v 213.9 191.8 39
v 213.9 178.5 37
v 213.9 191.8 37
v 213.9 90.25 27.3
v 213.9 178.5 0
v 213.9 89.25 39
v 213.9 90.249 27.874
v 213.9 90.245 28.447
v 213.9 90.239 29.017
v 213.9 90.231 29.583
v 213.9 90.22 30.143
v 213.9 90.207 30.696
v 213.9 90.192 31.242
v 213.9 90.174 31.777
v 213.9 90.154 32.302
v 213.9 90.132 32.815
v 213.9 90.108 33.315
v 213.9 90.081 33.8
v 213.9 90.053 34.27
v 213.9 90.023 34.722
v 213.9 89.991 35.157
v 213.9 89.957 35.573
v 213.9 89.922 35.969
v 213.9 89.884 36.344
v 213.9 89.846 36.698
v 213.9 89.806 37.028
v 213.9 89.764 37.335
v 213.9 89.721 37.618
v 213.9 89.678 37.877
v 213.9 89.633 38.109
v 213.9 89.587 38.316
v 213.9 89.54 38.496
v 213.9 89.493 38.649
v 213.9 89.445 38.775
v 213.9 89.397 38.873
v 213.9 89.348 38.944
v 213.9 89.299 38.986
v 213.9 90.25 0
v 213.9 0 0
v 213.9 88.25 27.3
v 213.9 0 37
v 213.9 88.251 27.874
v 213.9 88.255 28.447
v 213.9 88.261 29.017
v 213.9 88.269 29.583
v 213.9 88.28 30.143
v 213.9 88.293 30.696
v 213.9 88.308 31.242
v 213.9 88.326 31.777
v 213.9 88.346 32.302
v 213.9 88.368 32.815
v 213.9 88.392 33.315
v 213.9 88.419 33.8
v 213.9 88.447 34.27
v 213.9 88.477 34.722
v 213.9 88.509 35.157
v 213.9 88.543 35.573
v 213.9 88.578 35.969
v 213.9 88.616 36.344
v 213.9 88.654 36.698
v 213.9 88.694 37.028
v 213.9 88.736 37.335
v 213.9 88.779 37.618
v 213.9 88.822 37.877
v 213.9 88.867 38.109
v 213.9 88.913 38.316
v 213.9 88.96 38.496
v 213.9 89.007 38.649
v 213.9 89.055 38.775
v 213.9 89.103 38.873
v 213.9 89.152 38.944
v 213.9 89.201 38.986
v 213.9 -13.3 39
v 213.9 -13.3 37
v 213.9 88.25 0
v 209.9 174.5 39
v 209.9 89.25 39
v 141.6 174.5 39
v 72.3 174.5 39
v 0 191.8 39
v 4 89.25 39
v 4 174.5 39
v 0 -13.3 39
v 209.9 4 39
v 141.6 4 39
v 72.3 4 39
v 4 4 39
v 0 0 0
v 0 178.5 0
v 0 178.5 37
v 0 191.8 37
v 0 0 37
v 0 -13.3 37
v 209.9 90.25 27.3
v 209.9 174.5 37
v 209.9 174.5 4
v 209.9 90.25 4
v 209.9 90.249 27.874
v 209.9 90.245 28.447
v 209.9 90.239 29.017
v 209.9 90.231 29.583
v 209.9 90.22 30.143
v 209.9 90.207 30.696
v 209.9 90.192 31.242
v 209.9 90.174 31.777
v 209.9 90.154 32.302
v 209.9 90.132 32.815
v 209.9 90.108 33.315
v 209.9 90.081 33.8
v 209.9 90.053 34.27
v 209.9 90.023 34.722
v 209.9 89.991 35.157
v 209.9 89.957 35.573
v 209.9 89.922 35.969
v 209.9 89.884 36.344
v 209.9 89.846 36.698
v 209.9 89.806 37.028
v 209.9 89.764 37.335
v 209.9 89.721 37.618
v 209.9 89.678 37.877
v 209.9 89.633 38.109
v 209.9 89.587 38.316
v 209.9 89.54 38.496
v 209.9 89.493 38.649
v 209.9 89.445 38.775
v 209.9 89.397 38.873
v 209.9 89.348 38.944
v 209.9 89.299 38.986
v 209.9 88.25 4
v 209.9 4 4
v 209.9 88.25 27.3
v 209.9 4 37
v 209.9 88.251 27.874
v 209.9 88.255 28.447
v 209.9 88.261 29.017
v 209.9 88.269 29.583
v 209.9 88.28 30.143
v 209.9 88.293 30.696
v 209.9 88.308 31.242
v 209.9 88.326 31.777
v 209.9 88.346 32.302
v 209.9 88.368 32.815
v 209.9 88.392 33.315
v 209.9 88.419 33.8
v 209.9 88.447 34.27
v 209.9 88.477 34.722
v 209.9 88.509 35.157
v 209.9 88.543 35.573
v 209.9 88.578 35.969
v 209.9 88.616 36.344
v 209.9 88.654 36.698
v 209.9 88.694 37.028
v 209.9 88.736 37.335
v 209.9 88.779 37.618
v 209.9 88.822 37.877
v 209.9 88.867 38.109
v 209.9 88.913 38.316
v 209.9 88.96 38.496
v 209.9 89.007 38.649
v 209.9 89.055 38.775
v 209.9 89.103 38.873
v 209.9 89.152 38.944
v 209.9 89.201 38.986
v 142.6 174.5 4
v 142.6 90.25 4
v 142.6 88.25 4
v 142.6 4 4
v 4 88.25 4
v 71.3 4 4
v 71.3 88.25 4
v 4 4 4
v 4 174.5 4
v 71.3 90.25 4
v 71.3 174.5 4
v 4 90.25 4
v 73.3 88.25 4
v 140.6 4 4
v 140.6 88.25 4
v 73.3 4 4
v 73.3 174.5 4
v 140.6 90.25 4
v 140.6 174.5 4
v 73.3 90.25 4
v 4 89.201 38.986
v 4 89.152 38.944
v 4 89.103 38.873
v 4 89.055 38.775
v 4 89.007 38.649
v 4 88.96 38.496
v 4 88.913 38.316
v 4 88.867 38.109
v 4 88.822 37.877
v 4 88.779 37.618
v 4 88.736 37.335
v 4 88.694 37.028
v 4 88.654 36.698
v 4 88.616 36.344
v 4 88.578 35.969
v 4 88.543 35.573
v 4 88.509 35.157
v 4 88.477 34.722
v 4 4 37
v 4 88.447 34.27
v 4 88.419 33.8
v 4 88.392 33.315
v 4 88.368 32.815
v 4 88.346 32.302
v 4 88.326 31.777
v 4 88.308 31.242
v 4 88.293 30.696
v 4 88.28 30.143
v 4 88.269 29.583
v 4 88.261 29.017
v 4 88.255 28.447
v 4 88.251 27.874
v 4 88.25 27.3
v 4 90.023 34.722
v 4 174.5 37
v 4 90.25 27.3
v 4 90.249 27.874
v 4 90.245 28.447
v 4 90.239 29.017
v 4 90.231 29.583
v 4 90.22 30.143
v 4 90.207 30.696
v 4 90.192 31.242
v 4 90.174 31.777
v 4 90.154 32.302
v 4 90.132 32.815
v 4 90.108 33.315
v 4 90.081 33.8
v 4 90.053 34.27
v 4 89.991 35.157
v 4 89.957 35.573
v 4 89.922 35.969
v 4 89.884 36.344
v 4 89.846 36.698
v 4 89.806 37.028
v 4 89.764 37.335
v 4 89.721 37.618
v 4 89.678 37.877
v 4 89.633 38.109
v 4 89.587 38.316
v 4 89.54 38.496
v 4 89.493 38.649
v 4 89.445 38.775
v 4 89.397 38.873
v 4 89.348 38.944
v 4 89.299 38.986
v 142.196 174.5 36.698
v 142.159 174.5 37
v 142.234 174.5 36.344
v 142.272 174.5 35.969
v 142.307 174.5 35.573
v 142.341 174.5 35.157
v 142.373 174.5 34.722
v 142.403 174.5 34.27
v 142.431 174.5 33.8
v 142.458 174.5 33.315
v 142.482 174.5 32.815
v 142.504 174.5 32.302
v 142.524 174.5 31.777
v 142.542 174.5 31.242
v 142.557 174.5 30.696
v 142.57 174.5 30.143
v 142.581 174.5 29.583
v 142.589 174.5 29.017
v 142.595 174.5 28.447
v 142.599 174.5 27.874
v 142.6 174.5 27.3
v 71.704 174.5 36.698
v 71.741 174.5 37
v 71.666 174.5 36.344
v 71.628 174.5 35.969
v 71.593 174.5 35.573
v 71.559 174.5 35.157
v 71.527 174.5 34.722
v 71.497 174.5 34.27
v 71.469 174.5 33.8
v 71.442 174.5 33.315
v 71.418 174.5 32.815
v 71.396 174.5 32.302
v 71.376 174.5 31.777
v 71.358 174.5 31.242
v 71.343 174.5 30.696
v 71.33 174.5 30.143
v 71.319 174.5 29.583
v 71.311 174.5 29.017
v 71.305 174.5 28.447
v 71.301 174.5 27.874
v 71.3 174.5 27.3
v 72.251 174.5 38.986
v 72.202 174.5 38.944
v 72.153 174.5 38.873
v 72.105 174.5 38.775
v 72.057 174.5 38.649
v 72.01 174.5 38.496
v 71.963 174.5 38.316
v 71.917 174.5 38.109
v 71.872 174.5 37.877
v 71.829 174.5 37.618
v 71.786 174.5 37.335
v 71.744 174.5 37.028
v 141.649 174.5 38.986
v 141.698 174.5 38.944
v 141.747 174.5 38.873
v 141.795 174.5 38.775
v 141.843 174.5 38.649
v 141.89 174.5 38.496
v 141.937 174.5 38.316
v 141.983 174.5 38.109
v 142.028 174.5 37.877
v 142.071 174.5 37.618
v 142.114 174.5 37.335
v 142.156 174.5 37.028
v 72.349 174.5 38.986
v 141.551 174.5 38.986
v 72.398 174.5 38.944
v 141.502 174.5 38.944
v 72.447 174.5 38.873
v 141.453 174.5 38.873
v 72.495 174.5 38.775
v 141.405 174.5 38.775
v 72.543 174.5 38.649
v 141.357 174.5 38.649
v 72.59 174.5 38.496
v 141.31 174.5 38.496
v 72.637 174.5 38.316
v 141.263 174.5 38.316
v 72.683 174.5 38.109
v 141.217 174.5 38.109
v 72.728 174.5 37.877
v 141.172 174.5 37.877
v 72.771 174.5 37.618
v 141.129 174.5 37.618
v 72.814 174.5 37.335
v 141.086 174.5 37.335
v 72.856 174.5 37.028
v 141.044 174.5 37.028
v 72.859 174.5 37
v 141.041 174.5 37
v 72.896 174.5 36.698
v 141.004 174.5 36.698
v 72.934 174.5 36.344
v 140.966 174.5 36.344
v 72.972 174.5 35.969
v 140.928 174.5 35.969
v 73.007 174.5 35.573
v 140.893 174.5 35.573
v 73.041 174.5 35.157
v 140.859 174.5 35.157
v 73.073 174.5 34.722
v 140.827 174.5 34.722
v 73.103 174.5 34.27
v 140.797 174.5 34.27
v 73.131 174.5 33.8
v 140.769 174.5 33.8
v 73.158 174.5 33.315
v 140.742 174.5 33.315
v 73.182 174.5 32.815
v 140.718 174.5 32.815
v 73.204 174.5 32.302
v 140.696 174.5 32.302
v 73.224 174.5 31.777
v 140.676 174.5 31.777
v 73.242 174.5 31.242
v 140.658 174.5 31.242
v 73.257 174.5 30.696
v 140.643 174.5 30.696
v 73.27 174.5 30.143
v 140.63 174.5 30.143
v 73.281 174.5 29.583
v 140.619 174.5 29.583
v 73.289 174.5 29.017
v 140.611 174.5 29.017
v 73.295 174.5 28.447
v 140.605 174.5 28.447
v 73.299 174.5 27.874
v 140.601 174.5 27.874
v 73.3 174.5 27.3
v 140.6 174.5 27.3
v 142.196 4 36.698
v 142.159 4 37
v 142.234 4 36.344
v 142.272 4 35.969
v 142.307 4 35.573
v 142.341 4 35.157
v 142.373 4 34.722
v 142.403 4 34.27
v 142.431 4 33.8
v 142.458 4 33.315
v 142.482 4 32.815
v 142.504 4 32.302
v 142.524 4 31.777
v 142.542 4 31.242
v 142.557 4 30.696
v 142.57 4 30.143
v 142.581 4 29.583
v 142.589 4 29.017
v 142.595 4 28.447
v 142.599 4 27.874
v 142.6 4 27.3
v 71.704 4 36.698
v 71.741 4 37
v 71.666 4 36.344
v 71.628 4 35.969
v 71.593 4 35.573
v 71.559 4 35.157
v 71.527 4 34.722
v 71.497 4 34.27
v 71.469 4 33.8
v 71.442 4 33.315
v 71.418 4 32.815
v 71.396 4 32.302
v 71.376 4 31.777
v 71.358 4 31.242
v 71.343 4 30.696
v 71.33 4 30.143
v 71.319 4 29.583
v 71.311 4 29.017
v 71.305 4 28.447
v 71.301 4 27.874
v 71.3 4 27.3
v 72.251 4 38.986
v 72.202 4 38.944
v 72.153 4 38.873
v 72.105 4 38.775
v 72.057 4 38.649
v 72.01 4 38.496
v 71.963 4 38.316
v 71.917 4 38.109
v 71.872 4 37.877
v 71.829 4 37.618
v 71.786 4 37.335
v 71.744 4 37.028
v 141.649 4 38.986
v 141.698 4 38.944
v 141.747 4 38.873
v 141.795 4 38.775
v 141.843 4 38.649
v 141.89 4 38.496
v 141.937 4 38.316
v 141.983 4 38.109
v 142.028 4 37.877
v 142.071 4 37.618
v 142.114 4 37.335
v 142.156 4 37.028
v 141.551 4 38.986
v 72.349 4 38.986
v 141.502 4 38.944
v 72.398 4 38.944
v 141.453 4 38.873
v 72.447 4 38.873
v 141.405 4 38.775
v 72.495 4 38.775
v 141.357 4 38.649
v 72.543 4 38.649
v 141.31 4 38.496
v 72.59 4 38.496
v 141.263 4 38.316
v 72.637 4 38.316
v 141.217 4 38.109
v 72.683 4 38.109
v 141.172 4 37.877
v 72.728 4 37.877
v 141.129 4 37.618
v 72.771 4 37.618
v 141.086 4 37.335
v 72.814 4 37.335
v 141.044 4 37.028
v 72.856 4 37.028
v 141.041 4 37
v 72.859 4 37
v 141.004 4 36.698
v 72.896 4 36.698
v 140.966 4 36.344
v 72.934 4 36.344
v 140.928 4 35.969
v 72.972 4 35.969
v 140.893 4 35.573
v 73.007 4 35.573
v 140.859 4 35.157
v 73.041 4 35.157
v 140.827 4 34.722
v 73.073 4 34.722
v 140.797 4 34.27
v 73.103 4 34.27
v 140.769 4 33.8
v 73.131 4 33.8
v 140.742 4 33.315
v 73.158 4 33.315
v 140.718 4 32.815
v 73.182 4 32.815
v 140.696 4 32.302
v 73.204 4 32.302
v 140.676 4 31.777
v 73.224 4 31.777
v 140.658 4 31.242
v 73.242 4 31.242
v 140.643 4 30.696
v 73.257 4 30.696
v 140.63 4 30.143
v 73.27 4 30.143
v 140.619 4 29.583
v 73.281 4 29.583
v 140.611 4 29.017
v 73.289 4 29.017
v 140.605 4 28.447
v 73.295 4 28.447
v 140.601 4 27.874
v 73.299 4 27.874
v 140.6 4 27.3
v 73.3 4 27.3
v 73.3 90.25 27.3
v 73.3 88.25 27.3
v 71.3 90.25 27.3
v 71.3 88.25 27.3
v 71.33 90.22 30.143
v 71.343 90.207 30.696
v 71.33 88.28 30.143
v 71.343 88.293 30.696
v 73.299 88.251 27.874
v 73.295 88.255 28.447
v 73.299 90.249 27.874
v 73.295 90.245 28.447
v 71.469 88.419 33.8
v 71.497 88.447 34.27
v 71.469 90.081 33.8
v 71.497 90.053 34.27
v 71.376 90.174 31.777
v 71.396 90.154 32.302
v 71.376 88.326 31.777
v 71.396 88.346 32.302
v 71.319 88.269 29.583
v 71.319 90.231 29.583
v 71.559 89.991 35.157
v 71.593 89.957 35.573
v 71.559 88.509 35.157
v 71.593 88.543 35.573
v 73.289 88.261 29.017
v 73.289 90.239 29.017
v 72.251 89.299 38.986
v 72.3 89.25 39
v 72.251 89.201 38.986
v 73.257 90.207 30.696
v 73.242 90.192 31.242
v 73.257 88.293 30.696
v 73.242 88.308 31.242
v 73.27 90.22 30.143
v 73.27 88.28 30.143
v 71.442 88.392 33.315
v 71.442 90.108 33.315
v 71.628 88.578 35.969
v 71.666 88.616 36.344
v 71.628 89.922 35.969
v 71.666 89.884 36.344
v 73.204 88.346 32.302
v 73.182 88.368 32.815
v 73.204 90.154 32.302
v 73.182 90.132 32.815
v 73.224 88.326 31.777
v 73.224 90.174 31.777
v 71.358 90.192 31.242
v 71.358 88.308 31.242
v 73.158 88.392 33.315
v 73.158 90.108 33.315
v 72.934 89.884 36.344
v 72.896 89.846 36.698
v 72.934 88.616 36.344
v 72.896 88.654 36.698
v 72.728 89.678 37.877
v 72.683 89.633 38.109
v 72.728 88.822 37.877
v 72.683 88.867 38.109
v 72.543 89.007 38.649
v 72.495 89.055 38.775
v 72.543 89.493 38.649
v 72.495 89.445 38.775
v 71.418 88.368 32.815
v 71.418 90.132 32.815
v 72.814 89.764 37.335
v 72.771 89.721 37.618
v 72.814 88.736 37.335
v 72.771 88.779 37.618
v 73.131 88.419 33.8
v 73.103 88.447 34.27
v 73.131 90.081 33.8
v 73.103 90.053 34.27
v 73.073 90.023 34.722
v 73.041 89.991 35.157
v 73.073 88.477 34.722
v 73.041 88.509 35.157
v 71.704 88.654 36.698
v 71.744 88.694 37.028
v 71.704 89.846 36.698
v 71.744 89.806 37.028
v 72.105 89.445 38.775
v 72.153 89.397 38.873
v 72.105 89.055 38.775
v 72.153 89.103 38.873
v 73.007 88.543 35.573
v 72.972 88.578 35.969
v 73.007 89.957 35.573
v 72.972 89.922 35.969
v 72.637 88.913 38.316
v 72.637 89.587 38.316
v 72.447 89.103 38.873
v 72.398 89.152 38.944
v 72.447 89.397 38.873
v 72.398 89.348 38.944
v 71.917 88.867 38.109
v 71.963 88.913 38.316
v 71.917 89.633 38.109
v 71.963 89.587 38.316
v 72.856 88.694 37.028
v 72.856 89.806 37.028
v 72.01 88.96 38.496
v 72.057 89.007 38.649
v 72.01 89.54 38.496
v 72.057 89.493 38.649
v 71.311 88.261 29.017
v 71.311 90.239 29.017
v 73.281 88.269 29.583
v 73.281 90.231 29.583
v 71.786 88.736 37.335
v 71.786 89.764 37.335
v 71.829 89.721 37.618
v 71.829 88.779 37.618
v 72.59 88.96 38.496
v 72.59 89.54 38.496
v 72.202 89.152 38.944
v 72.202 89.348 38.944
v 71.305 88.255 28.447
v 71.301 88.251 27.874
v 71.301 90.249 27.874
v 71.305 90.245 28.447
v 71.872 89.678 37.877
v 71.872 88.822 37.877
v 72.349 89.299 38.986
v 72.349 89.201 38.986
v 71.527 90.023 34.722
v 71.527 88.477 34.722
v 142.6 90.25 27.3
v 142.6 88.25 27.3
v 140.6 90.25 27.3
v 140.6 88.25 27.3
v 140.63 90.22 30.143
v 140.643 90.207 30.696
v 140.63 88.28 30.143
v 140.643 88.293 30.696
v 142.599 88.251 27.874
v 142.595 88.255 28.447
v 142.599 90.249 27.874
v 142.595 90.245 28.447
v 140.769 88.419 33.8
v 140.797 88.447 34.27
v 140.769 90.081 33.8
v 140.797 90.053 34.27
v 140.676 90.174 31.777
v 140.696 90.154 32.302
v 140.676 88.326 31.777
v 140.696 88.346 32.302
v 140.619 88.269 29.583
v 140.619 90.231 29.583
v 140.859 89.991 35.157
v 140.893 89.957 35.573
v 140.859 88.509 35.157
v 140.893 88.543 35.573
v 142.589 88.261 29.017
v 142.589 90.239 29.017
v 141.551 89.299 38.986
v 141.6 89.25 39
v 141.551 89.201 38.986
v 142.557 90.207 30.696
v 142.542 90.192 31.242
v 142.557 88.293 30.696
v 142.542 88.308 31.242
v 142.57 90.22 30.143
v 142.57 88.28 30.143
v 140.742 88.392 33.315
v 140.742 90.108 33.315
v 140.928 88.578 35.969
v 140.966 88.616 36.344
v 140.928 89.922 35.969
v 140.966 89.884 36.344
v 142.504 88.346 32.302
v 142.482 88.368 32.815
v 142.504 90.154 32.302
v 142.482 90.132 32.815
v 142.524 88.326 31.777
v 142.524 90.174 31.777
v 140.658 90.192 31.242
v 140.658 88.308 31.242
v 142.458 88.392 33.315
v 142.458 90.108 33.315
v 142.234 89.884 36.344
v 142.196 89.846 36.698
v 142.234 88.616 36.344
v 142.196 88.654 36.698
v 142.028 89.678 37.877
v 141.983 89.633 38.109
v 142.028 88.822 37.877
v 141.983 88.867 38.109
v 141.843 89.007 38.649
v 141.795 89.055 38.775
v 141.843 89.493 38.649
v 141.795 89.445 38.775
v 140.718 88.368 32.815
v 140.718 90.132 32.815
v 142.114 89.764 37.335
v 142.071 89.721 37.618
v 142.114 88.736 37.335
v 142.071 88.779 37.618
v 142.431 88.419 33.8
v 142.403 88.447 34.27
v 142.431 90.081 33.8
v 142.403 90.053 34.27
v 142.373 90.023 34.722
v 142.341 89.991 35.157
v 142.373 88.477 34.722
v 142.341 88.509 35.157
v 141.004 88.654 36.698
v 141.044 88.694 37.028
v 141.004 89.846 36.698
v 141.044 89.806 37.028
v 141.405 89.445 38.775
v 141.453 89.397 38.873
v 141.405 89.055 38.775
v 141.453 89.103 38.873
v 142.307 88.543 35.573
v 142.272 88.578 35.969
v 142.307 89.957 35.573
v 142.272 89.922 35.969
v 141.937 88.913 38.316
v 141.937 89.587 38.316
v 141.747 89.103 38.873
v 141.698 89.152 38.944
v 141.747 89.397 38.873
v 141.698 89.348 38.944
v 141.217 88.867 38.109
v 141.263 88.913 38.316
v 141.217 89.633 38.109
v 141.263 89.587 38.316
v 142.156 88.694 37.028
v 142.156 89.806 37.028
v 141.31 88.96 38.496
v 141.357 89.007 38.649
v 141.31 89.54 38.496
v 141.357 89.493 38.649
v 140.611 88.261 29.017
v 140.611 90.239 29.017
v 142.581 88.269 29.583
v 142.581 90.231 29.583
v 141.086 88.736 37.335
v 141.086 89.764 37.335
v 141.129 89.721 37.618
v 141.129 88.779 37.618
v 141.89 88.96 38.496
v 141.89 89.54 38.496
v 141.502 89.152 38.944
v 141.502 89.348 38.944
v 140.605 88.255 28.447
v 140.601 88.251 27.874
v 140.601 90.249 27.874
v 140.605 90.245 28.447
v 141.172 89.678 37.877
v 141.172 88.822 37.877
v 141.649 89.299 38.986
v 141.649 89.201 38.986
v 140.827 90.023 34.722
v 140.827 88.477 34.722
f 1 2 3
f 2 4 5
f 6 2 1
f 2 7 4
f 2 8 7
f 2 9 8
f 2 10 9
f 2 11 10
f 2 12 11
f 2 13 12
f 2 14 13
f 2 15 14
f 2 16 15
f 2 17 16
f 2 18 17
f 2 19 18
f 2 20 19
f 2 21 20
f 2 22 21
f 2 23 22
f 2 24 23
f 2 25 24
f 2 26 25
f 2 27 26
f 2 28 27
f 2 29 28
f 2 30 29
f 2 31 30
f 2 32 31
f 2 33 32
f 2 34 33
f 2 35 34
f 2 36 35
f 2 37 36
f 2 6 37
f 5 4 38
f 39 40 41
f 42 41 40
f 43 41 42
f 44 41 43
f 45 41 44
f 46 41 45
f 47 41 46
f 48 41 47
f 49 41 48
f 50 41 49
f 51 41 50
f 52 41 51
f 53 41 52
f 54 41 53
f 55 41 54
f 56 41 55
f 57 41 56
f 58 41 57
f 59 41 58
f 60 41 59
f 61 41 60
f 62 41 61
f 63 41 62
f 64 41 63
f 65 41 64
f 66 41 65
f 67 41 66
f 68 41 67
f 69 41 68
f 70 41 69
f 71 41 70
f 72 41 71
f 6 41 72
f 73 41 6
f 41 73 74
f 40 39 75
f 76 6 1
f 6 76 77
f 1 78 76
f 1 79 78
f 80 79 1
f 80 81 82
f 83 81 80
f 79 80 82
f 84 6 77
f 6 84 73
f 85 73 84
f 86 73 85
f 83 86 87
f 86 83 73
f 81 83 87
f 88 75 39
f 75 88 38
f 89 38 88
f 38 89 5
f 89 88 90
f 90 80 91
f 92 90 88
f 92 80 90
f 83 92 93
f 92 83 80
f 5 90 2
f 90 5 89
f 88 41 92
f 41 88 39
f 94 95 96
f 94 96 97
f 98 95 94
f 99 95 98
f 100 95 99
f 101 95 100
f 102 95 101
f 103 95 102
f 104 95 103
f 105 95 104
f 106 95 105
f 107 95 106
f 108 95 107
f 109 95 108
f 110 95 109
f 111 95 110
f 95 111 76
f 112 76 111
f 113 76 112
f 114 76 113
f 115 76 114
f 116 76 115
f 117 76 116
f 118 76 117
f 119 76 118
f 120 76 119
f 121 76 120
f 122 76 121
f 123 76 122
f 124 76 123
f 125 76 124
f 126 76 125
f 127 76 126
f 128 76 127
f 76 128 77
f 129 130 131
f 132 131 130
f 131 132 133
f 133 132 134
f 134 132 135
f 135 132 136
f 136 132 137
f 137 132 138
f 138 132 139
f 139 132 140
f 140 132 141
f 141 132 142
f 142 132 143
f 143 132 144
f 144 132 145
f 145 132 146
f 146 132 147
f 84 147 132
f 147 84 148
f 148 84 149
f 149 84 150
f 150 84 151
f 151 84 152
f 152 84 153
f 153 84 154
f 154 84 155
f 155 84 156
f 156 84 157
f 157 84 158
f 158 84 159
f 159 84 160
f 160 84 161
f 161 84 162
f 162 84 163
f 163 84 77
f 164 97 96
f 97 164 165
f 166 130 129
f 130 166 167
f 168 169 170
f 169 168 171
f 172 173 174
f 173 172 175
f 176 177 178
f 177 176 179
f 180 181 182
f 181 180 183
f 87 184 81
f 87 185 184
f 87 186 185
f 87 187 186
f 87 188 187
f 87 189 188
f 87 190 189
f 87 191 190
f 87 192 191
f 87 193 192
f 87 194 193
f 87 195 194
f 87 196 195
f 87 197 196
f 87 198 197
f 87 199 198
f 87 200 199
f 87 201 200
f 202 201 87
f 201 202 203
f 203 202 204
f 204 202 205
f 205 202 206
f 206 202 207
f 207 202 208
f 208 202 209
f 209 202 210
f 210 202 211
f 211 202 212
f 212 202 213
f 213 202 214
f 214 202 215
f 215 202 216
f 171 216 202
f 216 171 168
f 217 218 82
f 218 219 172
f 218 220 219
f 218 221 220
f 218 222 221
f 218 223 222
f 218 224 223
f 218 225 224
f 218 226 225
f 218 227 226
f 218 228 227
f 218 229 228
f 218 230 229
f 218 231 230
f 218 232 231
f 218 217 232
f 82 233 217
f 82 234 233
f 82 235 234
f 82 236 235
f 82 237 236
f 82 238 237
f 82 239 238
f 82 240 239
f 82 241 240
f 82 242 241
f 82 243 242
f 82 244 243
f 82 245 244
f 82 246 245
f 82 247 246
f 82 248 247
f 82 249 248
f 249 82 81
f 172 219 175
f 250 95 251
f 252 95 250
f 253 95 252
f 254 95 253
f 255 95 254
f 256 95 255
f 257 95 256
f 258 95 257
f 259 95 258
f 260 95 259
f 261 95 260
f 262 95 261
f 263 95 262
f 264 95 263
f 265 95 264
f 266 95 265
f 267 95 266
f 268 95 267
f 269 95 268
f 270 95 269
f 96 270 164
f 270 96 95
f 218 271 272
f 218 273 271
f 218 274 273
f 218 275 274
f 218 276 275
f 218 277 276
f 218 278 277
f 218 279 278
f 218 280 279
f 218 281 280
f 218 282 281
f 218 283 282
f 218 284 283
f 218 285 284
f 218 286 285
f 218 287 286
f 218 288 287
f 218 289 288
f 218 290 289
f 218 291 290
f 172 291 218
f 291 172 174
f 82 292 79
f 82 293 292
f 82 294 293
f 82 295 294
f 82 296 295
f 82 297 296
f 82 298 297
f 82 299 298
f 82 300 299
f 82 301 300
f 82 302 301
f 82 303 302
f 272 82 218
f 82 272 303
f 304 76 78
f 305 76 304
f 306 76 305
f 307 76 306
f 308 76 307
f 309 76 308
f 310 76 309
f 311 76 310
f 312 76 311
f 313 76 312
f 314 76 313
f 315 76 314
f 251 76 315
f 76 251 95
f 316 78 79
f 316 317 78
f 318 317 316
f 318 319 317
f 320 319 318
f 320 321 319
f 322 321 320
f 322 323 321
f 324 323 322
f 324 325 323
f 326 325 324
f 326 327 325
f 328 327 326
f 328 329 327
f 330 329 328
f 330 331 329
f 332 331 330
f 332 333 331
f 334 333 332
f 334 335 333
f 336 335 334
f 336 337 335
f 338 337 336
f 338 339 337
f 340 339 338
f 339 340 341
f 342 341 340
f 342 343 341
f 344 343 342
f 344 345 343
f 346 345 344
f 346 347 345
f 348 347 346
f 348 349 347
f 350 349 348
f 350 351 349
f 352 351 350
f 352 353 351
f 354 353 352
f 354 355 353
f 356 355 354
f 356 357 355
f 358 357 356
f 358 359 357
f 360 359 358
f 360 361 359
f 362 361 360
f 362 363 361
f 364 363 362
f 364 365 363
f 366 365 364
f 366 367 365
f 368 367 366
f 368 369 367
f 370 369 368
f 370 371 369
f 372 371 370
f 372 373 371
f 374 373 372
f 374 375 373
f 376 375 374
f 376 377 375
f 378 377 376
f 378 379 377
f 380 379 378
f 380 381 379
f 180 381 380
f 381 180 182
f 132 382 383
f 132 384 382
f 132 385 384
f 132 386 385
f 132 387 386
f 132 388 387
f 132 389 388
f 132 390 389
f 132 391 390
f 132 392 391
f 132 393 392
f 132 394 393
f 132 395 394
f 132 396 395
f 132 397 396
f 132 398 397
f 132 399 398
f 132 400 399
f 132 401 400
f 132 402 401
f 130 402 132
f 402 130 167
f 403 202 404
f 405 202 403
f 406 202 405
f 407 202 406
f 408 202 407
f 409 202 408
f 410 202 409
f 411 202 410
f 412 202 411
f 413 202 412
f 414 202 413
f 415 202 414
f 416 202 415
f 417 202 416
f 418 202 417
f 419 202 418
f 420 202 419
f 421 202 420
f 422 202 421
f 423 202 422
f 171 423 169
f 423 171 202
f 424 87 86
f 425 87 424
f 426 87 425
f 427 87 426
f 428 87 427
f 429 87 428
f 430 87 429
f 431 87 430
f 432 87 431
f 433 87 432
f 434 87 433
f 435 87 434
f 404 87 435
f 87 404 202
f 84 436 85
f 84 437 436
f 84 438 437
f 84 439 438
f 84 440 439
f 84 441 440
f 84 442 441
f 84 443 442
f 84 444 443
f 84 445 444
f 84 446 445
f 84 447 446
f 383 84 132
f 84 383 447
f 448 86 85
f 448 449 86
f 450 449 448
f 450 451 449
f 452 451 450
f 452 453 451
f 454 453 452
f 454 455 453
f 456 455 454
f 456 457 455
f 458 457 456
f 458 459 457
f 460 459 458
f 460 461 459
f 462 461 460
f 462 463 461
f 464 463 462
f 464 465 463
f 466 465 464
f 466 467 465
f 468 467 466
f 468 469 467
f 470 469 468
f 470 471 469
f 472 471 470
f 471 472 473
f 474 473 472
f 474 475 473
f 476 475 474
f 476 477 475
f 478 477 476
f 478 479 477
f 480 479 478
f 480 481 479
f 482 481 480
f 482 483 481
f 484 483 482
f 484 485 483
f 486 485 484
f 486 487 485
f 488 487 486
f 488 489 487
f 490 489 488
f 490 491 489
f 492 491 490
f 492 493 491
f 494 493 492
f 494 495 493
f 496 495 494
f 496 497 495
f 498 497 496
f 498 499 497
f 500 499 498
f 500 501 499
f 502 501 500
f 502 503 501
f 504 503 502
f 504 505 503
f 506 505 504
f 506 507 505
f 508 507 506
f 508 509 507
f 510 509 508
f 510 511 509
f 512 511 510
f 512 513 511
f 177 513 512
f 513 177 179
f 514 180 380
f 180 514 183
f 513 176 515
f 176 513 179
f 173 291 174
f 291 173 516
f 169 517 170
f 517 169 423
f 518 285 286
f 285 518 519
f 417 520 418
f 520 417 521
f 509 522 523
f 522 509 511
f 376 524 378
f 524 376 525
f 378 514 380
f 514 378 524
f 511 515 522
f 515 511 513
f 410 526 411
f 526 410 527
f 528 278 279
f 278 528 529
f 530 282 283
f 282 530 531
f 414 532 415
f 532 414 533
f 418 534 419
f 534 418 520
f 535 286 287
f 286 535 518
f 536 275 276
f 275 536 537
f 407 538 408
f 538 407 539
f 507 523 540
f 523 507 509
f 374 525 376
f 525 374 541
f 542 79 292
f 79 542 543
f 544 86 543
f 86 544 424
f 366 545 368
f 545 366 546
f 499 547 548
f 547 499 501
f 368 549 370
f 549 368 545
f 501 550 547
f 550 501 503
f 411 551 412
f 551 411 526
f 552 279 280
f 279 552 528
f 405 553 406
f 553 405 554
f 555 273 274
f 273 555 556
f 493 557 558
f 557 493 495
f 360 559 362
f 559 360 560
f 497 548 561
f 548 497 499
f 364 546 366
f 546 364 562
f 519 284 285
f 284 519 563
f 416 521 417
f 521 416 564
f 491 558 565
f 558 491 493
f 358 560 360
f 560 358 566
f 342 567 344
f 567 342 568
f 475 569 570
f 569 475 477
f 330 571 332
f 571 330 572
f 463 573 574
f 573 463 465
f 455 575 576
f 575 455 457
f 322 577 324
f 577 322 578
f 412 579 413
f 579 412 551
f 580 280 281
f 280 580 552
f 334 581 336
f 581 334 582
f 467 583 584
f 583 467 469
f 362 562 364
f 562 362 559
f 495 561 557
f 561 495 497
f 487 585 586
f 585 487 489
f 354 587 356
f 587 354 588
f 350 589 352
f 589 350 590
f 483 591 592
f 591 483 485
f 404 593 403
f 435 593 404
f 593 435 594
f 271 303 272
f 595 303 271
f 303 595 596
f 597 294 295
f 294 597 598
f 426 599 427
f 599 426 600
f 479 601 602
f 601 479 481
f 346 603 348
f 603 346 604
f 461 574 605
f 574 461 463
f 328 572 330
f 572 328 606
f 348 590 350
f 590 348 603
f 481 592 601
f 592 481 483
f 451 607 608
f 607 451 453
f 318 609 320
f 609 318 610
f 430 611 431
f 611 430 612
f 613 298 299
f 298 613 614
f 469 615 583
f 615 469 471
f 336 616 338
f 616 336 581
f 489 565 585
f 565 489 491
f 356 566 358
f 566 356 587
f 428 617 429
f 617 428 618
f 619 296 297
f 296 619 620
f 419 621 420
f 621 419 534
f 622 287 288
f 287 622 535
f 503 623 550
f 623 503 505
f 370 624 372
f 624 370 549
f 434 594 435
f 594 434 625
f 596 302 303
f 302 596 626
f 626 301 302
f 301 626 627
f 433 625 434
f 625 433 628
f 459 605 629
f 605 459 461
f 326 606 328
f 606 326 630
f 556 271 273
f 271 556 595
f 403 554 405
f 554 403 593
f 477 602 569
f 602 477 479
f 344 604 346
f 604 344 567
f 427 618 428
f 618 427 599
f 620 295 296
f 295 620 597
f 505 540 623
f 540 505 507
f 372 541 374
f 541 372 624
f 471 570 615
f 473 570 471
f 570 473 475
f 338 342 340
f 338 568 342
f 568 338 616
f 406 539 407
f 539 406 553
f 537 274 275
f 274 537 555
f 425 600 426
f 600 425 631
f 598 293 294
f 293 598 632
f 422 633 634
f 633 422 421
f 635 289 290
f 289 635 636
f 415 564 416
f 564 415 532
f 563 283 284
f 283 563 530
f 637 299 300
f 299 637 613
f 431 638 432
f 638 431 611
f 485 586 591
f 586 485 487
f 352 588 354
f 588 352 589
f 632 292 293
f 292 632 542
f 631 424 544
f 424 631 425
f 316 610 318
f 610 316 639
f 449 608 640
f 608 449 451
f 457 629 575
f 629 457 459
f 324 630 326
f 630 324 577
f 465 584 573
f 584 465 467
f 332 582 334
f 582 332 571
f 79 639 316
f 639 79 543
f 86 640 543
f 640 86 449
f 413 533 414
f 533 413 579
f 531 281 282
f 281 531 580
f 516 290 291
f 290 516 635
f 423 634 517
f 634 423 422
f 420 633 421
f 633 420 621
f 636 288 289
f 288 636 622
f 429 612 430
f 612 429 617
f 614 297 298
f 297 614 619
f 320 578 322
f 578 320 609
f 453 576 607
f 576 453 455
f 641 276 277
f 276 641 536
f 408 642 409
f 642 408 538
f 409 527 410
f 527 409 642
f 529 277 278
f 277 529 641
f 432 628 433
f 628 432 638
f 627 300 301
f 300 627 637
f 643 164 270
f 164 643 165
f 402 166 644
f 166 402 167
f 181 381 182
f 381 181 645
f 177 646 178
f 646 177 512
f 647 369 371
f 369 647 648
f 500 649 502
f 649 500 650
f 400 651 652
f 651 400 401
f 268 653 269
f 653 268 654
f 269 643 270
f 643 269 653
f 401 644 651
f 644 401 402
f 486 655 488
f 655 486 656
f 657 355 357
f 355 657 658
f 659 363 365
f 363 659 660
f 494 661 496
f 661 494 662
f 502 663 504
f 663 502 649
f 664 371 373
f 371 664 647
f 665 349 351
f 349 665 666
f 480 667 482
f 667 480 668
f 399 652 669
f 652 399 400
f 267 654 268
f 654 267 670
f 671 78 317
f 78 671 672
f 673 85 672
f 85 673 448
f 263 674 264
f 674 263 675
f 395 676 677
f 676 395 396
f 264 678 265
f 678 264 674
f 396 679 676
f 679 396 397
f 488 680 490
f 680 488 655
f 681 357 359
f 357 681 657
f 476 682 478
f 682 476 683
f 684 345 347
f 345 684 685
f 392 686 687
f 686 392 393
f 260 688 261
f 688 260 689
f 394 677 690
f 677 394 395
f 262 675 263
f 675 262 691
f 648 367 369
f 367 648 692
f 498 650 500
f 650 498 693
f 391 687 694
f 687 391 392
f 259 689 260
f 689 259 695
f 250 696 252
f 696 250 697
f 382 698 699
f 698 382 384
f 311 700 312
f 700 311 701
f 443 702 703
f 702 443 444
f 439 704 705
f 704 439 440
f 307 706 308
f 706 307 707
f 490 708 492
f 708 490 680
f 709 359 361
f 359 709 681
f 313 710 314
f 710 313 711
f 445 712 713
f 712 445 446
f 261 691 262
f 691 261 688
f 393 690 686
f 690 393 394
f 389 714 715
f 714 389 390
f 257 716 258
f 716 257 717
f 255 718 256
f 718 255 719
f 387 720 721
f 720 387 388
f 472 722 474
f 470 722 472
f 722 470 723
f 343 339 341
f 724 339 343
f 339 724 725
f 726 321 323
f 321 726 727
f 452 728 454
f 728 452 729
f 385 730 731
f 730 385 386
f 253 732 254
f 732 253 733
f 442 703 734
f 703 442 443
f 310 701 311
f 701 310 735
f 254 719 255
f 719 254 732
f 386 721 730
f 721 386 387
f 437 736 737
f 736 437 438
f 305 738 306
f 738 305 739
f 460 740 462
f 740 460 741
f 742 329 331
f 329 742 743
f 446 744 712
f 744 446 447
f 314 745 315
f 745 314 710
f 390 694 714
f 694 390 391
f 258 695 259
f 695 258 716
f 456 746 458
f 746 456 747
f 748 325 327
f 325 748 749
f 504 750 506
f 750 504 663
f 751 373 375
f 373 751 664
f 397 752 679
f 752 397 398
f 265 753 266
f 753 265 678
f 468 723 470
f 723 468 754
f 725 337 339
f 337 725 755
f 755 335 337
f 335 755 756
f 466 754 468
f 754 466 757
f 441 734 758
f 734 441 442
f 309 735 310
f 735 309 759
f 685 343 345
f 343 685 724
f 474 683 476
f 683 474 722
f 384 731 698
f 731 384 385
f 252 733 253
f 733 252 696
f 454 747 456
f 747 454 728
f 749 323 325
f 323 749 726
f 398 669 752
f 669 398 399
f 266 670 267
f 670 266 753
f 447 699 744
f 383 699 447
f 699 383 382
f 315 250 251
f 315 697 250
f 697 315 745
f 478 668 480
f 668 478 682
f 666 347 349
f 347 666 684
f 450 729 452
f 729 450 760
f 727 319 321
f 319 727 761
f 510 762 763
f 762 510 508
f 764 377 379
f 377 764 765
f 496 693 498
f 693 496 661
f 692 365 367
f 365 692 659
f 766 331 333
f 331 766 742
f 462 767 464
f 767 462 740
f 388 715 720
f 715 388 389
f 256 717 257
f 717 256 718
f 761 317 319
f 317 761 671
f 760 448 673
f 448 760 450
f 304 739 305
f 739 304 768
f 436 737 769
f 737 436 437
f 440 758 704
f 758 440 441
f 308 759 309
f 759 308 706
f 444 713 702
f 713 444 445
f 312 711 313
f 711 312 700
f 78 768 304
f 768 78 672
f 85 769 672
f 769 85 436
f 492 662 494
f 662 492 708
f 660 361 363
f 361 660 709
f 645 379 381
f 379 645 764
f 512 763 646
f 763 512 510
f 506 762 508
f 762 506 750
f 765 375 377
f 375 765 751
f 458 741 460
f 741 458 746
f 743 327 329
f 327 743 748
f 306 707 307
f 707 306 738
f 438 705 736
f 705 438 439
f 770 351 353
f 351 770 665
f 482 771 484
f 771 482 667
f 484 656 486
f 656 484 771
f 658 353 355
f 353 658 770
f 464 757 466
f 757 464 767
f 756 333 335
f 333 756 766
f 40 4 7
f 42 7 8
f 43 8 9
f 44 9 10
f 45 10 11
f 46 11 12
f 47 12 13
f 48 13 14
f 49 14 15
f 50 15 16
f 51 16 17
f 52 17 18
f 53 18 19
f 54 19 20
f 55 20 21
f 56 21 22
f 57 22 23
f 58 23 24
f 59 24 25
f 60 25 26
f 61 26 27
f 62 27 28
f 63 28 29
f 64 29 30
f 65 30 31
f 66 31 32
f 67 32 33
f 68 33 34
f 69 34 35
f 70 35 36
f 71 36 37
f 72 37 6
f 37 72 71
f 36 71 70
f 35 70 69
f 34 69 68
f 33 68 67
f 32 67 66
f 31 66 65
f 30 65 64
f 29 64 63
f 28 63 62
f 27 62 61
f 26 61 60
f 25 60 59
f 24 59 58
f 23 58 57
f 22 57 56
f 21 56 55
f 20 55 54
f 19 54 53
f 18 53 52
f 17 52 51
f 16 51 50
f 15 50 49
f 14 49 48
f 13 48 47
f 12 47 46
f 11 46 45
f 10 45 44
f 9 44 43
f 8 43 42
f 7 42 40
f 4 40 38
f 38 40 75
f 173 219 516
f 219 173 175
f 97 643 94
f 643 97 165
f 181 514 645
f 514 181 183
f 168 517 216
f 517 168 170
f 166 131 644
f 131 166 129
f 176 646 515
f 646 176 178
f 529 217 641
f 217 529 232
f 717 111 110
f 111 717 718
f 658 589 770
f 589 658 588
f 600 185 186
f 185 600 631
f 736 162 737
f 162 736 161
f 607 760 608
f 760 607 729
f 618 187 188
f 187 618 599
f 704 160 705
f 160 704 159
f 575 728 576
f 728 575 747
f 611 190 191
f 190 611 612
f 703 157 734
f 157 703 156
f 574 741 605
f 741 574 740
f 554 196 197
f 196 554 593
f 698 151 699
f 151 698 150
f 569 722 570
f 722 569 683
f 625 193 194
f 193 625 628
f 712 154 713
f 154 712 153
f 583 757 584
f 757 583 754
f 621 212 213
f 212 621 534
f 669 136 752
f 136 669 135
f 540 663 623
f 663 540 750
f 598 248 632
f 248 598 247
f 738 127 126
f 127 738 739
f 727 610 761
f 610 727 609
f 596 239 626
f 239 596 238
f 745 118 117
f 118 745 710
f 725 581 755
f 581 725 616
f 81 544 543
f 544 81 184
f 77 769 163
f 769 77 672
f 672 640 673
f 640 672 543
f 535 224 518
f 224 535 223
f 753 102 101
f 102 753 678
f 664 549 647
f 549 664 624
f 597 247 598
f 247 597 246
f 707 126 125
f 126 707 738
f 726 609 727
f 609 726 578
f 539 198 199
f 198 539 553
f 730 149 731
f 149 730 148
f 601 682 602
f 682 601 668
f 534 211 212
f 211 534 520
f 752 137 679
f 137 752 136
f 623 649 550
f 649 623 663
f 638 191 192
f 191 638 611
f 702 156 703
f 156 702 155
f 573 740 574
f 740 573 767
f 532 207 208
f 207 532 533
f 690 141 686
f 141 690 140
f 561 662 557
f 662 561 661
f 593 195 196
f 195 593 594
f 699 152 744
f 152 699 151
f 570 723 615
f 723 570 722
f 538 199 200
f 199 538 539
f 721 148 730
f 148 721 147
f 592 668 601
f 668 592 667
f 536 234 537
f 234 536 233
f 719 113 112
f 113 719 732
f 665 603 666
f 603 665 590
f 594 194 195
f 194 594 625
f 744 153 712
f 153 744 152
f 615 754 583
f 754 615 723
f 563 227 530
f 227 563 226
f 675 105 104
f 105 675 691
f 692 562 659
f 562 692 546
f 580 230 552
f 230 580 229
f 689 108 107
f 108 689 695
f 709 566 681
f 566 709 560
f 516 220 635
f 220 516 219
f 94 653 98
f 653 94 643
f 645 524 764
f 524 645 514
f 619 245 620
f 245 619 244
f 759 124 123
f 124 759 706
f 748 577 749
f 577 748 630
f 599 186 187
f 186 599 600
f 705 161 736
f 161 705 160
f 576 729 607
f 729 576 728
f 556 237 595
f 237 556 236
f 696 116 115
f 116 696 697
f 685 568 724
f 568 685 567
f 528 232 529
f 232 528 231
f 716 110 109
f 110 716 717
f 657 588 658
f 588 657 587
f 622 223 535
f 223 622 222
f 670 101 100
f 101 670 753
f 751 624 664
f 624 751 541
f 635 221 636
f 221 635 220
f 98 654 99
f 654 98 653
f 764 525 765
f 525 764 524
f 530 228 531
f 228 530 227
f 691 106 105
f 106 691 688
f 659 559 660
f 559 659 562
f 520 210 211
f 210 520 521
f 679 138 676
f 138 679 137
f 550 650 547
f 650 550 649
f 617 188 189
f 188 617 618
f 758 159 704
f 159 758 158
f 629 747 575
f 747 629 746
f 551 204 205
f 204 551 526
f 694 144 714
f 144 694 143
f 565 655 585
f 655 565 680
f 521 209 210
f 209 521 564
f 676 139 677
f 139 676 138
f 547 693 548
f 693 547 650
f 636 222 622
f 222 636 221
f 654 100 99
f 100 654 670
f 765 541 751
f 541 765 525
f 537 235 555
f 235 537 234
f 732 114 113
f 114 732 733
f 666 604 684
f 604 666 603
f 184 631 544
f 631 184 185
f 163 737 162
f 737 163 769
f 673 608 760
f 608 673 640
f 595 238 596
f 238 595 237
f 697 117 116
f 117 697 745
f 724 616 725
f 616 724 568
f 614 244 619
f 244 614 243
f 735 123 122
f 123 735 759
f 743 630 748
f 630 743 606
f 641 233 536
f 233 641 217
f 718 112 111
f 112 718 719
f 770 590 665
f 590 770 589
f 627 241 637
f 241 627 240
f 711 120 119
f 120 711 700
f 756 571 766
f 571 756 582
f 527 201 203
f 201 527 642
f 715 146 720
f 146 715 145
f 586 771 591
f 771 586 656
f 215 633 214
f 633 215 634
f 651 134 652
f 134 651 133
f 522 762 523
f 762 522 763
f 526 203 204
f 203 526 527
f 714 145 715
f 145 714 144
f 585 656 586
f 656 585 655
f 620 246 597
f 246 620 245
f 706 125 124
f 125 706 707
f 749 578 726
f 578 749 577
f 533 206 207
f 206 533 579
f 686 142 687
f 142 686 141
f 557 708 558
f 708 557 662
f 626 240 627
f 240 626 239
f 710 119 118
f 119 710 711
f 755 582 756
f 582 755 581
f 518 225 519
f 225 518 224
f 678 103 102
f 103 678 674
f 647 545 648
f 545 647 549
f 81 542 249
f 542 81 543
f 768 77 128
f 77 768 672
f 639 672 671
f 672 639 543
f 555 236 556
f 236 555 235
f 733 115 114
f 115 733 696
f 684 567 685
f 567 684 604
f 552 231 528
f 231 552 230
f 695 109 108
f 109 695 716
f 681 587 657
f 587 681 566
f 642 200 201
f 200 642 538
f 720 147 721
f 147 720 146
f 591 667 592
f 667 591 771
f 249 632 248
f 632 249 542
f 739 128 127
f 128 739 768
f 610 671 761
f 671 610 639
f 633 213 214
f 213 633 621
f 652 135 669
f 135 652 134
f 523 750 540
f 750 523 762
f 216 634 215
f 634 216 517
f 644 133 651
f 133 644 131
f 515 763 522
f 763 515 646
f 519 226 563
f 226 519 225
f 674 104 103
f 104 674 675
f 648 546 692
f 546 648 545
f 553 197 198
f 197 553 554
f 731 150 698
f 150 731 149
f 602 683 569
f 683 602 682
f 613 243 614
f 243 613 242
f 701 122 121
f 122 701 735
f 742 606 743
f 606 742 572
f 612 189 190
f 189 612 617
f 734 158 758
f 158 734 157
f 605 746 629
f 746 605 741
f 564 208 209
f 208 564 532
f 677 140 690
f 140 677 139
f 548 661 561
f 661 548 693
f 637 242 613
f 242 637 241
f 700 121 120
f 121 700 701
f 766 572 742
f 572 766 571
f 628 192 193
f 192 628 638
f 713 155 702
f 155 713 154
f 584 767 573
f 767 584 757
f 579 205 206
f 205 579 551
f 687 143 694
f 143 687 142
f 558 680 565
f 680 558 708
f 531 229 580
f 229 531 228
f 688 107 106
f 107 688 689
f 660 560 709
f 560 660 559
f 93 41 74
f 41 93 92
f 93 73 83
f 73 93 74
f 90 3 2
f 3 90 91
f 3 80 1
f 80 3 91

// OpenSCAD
// External depth of insert tray
depth  = 178.5;             // [150:0.5:200]
// Height of insert tray below the lip
height = 39;                // [30:0.5:50]
// Width of each cubby
cubby_width = 67.3;         // [47.3:0.25:87.3]
// Thickness of exterior walls and floor
wall_thickness = 4;         // [1:4]
// Thickness of interior walls
int_wall_thickness = 2;     // [1:4]
// Height of interior walls
int_wall_height = height;   // [0:0.5:50]
// Depth over overhang
overhang_depth  = 13.3;     // [10:0.1:15]
// Height of overhang lip, set to 0 for no lip 
overhang_lip = 0;           //[0:0.1:15]
// Thickness of overhang and lip
overhang_thickness = 2;     // [1:0.1:4]
// Number of cubby columns
cubby_cols = 3;             // [1:1:10]
length = cubby_cols*cubby_width + (cubby_cols-1)*int_wall_thickness + 2*wall_thickness;

module overhang(){
    cube([length, overhang_depth + wall_thickness, overhang_thickness]);
    if(overhang_lip > 0){
        translate([0,overhang_depth + wall_thickness, 0.001-overhang_lip]){
            cube([length, overhang_thickness, overhang_lip]);
        }
        translate([length,overhang_depth+wall_thickness,0]){
            rotate([0,-90,0]){
                intersection(){
                    cube([overhang_thickness, overhang_thickness, length]);
                    cylinder(r=overhang_thickness,h=length,$fn=128);
                }
            }
        }
    }
}

bevel_h = 0.3;
module intwall(x,y,z){
    scale([x,y,z]){
        union(){
            cube([1,1,1-bevel_h]);
            translate([y > x ? 0.5 : 0,
                       x > y ? 0.5 : 1,
                       1-bevel_h]){
                scale([1/( (y > x) ? (2*bevel_h) : 1),
                        1/( (x > y) ? (2*bevel_h) : 1),
                        1]){
                    rotate([(y > x) ? 90 : 0, (x > y) ? 90 : 0,0]){
                        cylinder(r=bevel_h,h=1,$fn=128);
                    }
                }
            }
        }
    }
}

union(){
    difference(){
        cube([length, depth, height]);
        translate([wall_thickness, wall_thickness, wall_thickness]){
            cube([length - (2*wall_thickness), 
                  depth - (2*wall_thickness),
                  height]);
        }
        
    }
    for(offset = [wall_thickness + cubby_width:cubby_width + int_wall_thickness:length-wall_thickness - 1]){
        translate([offset, 0, 0]){
            intwall(int_wall_thickness, depth, int_wall_height);
        }
    }
    translate([0,(depth - int_wall_thickness)/2, 0]){
        intwall(length, int_wall_thickness, int_wall_height);
    }
    
    translate([0, wall_thickness, height - overhang_thickness]){
        mirror([0,1,0]){
            overhang();
        }
    }

    translate([0,depth - wall_thickness, height - overhang_thickness]){
        overhang();
    }
}
